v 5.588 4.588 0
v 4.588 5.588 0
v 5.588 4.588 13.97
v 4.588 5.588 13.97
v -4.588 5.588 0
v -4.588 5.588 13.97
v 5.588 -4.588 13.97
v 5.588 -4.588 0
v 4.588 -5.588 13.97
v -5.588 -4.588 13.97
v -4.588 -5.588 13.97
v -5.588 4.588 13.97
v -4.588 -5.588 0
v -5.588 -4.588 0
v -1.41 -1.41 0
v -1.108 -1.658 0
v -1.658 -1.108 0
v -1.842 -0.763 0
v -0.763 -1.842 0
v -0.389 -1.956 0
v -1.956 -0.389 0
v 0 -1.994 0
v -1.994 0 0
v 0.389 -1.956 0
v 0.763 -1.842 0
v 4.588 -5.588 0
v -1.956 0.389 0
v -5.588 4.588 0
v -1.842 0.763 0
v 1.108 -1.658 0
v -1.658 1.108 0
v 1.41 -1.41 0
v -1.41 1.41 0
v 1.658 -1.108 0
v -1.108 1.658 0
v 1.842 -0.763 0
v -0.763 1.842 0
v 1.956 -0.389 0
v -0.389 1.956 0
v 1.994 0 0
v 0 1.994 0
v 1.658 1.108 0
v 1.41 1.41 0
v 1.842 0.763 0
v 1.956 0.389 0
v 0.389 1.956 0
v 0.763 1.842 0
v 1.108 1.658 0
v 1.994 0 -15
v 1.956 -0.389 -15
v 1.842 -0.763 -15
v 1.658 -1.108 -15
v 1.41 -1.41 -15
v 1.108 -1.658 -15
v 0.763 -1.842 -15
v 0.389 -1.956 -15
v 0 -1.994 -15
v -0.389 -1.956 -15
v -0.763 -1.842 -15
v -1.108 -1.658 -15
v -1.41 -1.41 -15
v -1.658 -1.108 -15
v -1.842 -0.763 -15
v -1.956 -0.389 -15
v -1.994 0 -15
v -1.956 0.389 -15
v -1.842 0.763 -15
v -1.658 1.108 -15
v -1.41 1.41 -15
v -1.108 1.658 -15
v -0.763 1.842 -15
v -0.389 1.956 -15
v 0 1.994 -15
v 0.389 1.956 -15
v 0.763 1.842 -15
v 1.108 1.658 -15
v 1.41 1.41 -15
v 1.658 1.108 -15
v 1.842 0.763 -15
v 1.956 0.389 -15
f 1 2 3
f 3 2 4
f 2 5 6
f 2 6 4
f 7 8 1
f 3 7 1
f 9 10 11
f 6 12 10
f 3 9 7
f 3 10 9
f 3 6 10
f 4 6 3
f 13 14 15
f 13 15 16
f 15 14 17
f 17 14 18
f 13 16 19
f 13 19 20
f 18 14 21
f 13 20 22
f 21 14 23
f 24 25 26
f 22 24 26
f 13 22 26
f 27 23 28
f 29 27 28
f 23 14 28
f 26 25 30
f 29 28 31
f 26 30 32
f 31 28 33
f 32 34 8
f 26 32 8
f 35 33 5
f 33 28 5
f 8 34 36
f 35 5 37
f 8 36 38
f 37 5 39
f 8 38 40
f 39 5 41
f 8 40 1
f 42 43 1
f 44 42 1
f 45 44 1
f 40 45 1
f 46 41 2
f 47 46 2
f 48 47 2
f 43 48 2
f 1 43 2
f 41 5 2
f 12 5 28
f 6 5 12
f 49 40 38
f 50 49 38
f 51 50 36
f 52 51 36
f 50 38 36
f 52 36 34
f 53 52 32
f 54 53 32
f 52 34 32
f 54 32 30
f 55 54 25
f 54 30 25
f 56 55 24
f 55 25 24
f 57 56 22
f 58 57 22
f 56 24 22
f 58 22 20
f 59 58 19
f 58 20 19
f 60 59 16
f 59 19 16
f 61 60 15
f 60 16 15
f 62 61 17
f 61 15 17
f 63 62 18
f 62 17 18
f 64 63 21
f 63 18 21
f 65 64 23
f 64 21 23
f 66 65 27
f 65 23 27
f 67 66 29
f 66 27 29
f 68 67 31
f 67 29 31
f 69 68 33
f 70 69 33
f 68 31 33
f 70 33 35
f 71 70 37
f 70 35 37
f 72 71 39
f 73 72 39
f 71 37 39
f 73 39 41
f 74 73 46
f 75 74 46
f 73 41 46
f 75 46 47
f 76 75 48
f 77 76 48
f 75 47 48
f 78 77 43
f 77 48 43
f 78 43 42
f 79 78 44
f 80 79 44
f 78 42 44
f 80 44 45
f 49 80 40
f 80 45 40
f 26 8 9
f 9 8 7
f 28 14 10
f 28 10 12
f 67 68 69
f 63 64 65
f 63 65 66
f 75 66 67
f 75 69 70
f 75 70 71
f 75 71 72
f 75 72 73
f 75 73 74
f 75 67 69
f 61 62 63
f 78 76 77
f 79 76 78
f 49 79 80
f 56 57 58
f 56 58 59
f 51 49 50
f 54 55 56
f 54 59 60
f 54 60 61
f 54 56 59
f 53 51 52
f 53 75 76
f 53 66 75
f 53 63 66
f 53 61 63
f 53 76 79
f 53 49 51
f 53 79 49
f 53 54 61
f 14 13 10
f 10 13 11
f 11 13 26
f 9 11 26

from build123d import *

# Parameters (mm, degrees)
F0_W     = 11.176
F0_H     = 11.176
F1_DEPTH = 13.97
F2_SIZE  = 1
F3_R     = 1.9939
F4_DEPTH = 15


with BuildPart() as f1:
    # F0 (on Top) → F1 (new body)
    with BuildSketch(Plane.XY):
        Rectangle(F0_W, F0_H)
    extrude(amount=F1_DEPTH)

    # F2
    f2_edges = [f1.edges().sort_by_distance(p)[0] for p in [
        (5.588, 5.588, 6.985),
        (5.588, -5.588, 6.985),
        (-5.588, -5.588, 6.985),
        (-5.588, 5.588, 6.985),
    ]]
    chamfer(f2_edges, length=F2_SIZE)

    # F3 (on face) → F4 (join)
    with BuildSketch(Plane(origin=(0, 0, 0), x_dir=(1, 0, 0), z_dir=(0, 0, -1))):
        Circle(F3_R)
    extrude(amount=F4_DEPTH)


solid = f1.part
